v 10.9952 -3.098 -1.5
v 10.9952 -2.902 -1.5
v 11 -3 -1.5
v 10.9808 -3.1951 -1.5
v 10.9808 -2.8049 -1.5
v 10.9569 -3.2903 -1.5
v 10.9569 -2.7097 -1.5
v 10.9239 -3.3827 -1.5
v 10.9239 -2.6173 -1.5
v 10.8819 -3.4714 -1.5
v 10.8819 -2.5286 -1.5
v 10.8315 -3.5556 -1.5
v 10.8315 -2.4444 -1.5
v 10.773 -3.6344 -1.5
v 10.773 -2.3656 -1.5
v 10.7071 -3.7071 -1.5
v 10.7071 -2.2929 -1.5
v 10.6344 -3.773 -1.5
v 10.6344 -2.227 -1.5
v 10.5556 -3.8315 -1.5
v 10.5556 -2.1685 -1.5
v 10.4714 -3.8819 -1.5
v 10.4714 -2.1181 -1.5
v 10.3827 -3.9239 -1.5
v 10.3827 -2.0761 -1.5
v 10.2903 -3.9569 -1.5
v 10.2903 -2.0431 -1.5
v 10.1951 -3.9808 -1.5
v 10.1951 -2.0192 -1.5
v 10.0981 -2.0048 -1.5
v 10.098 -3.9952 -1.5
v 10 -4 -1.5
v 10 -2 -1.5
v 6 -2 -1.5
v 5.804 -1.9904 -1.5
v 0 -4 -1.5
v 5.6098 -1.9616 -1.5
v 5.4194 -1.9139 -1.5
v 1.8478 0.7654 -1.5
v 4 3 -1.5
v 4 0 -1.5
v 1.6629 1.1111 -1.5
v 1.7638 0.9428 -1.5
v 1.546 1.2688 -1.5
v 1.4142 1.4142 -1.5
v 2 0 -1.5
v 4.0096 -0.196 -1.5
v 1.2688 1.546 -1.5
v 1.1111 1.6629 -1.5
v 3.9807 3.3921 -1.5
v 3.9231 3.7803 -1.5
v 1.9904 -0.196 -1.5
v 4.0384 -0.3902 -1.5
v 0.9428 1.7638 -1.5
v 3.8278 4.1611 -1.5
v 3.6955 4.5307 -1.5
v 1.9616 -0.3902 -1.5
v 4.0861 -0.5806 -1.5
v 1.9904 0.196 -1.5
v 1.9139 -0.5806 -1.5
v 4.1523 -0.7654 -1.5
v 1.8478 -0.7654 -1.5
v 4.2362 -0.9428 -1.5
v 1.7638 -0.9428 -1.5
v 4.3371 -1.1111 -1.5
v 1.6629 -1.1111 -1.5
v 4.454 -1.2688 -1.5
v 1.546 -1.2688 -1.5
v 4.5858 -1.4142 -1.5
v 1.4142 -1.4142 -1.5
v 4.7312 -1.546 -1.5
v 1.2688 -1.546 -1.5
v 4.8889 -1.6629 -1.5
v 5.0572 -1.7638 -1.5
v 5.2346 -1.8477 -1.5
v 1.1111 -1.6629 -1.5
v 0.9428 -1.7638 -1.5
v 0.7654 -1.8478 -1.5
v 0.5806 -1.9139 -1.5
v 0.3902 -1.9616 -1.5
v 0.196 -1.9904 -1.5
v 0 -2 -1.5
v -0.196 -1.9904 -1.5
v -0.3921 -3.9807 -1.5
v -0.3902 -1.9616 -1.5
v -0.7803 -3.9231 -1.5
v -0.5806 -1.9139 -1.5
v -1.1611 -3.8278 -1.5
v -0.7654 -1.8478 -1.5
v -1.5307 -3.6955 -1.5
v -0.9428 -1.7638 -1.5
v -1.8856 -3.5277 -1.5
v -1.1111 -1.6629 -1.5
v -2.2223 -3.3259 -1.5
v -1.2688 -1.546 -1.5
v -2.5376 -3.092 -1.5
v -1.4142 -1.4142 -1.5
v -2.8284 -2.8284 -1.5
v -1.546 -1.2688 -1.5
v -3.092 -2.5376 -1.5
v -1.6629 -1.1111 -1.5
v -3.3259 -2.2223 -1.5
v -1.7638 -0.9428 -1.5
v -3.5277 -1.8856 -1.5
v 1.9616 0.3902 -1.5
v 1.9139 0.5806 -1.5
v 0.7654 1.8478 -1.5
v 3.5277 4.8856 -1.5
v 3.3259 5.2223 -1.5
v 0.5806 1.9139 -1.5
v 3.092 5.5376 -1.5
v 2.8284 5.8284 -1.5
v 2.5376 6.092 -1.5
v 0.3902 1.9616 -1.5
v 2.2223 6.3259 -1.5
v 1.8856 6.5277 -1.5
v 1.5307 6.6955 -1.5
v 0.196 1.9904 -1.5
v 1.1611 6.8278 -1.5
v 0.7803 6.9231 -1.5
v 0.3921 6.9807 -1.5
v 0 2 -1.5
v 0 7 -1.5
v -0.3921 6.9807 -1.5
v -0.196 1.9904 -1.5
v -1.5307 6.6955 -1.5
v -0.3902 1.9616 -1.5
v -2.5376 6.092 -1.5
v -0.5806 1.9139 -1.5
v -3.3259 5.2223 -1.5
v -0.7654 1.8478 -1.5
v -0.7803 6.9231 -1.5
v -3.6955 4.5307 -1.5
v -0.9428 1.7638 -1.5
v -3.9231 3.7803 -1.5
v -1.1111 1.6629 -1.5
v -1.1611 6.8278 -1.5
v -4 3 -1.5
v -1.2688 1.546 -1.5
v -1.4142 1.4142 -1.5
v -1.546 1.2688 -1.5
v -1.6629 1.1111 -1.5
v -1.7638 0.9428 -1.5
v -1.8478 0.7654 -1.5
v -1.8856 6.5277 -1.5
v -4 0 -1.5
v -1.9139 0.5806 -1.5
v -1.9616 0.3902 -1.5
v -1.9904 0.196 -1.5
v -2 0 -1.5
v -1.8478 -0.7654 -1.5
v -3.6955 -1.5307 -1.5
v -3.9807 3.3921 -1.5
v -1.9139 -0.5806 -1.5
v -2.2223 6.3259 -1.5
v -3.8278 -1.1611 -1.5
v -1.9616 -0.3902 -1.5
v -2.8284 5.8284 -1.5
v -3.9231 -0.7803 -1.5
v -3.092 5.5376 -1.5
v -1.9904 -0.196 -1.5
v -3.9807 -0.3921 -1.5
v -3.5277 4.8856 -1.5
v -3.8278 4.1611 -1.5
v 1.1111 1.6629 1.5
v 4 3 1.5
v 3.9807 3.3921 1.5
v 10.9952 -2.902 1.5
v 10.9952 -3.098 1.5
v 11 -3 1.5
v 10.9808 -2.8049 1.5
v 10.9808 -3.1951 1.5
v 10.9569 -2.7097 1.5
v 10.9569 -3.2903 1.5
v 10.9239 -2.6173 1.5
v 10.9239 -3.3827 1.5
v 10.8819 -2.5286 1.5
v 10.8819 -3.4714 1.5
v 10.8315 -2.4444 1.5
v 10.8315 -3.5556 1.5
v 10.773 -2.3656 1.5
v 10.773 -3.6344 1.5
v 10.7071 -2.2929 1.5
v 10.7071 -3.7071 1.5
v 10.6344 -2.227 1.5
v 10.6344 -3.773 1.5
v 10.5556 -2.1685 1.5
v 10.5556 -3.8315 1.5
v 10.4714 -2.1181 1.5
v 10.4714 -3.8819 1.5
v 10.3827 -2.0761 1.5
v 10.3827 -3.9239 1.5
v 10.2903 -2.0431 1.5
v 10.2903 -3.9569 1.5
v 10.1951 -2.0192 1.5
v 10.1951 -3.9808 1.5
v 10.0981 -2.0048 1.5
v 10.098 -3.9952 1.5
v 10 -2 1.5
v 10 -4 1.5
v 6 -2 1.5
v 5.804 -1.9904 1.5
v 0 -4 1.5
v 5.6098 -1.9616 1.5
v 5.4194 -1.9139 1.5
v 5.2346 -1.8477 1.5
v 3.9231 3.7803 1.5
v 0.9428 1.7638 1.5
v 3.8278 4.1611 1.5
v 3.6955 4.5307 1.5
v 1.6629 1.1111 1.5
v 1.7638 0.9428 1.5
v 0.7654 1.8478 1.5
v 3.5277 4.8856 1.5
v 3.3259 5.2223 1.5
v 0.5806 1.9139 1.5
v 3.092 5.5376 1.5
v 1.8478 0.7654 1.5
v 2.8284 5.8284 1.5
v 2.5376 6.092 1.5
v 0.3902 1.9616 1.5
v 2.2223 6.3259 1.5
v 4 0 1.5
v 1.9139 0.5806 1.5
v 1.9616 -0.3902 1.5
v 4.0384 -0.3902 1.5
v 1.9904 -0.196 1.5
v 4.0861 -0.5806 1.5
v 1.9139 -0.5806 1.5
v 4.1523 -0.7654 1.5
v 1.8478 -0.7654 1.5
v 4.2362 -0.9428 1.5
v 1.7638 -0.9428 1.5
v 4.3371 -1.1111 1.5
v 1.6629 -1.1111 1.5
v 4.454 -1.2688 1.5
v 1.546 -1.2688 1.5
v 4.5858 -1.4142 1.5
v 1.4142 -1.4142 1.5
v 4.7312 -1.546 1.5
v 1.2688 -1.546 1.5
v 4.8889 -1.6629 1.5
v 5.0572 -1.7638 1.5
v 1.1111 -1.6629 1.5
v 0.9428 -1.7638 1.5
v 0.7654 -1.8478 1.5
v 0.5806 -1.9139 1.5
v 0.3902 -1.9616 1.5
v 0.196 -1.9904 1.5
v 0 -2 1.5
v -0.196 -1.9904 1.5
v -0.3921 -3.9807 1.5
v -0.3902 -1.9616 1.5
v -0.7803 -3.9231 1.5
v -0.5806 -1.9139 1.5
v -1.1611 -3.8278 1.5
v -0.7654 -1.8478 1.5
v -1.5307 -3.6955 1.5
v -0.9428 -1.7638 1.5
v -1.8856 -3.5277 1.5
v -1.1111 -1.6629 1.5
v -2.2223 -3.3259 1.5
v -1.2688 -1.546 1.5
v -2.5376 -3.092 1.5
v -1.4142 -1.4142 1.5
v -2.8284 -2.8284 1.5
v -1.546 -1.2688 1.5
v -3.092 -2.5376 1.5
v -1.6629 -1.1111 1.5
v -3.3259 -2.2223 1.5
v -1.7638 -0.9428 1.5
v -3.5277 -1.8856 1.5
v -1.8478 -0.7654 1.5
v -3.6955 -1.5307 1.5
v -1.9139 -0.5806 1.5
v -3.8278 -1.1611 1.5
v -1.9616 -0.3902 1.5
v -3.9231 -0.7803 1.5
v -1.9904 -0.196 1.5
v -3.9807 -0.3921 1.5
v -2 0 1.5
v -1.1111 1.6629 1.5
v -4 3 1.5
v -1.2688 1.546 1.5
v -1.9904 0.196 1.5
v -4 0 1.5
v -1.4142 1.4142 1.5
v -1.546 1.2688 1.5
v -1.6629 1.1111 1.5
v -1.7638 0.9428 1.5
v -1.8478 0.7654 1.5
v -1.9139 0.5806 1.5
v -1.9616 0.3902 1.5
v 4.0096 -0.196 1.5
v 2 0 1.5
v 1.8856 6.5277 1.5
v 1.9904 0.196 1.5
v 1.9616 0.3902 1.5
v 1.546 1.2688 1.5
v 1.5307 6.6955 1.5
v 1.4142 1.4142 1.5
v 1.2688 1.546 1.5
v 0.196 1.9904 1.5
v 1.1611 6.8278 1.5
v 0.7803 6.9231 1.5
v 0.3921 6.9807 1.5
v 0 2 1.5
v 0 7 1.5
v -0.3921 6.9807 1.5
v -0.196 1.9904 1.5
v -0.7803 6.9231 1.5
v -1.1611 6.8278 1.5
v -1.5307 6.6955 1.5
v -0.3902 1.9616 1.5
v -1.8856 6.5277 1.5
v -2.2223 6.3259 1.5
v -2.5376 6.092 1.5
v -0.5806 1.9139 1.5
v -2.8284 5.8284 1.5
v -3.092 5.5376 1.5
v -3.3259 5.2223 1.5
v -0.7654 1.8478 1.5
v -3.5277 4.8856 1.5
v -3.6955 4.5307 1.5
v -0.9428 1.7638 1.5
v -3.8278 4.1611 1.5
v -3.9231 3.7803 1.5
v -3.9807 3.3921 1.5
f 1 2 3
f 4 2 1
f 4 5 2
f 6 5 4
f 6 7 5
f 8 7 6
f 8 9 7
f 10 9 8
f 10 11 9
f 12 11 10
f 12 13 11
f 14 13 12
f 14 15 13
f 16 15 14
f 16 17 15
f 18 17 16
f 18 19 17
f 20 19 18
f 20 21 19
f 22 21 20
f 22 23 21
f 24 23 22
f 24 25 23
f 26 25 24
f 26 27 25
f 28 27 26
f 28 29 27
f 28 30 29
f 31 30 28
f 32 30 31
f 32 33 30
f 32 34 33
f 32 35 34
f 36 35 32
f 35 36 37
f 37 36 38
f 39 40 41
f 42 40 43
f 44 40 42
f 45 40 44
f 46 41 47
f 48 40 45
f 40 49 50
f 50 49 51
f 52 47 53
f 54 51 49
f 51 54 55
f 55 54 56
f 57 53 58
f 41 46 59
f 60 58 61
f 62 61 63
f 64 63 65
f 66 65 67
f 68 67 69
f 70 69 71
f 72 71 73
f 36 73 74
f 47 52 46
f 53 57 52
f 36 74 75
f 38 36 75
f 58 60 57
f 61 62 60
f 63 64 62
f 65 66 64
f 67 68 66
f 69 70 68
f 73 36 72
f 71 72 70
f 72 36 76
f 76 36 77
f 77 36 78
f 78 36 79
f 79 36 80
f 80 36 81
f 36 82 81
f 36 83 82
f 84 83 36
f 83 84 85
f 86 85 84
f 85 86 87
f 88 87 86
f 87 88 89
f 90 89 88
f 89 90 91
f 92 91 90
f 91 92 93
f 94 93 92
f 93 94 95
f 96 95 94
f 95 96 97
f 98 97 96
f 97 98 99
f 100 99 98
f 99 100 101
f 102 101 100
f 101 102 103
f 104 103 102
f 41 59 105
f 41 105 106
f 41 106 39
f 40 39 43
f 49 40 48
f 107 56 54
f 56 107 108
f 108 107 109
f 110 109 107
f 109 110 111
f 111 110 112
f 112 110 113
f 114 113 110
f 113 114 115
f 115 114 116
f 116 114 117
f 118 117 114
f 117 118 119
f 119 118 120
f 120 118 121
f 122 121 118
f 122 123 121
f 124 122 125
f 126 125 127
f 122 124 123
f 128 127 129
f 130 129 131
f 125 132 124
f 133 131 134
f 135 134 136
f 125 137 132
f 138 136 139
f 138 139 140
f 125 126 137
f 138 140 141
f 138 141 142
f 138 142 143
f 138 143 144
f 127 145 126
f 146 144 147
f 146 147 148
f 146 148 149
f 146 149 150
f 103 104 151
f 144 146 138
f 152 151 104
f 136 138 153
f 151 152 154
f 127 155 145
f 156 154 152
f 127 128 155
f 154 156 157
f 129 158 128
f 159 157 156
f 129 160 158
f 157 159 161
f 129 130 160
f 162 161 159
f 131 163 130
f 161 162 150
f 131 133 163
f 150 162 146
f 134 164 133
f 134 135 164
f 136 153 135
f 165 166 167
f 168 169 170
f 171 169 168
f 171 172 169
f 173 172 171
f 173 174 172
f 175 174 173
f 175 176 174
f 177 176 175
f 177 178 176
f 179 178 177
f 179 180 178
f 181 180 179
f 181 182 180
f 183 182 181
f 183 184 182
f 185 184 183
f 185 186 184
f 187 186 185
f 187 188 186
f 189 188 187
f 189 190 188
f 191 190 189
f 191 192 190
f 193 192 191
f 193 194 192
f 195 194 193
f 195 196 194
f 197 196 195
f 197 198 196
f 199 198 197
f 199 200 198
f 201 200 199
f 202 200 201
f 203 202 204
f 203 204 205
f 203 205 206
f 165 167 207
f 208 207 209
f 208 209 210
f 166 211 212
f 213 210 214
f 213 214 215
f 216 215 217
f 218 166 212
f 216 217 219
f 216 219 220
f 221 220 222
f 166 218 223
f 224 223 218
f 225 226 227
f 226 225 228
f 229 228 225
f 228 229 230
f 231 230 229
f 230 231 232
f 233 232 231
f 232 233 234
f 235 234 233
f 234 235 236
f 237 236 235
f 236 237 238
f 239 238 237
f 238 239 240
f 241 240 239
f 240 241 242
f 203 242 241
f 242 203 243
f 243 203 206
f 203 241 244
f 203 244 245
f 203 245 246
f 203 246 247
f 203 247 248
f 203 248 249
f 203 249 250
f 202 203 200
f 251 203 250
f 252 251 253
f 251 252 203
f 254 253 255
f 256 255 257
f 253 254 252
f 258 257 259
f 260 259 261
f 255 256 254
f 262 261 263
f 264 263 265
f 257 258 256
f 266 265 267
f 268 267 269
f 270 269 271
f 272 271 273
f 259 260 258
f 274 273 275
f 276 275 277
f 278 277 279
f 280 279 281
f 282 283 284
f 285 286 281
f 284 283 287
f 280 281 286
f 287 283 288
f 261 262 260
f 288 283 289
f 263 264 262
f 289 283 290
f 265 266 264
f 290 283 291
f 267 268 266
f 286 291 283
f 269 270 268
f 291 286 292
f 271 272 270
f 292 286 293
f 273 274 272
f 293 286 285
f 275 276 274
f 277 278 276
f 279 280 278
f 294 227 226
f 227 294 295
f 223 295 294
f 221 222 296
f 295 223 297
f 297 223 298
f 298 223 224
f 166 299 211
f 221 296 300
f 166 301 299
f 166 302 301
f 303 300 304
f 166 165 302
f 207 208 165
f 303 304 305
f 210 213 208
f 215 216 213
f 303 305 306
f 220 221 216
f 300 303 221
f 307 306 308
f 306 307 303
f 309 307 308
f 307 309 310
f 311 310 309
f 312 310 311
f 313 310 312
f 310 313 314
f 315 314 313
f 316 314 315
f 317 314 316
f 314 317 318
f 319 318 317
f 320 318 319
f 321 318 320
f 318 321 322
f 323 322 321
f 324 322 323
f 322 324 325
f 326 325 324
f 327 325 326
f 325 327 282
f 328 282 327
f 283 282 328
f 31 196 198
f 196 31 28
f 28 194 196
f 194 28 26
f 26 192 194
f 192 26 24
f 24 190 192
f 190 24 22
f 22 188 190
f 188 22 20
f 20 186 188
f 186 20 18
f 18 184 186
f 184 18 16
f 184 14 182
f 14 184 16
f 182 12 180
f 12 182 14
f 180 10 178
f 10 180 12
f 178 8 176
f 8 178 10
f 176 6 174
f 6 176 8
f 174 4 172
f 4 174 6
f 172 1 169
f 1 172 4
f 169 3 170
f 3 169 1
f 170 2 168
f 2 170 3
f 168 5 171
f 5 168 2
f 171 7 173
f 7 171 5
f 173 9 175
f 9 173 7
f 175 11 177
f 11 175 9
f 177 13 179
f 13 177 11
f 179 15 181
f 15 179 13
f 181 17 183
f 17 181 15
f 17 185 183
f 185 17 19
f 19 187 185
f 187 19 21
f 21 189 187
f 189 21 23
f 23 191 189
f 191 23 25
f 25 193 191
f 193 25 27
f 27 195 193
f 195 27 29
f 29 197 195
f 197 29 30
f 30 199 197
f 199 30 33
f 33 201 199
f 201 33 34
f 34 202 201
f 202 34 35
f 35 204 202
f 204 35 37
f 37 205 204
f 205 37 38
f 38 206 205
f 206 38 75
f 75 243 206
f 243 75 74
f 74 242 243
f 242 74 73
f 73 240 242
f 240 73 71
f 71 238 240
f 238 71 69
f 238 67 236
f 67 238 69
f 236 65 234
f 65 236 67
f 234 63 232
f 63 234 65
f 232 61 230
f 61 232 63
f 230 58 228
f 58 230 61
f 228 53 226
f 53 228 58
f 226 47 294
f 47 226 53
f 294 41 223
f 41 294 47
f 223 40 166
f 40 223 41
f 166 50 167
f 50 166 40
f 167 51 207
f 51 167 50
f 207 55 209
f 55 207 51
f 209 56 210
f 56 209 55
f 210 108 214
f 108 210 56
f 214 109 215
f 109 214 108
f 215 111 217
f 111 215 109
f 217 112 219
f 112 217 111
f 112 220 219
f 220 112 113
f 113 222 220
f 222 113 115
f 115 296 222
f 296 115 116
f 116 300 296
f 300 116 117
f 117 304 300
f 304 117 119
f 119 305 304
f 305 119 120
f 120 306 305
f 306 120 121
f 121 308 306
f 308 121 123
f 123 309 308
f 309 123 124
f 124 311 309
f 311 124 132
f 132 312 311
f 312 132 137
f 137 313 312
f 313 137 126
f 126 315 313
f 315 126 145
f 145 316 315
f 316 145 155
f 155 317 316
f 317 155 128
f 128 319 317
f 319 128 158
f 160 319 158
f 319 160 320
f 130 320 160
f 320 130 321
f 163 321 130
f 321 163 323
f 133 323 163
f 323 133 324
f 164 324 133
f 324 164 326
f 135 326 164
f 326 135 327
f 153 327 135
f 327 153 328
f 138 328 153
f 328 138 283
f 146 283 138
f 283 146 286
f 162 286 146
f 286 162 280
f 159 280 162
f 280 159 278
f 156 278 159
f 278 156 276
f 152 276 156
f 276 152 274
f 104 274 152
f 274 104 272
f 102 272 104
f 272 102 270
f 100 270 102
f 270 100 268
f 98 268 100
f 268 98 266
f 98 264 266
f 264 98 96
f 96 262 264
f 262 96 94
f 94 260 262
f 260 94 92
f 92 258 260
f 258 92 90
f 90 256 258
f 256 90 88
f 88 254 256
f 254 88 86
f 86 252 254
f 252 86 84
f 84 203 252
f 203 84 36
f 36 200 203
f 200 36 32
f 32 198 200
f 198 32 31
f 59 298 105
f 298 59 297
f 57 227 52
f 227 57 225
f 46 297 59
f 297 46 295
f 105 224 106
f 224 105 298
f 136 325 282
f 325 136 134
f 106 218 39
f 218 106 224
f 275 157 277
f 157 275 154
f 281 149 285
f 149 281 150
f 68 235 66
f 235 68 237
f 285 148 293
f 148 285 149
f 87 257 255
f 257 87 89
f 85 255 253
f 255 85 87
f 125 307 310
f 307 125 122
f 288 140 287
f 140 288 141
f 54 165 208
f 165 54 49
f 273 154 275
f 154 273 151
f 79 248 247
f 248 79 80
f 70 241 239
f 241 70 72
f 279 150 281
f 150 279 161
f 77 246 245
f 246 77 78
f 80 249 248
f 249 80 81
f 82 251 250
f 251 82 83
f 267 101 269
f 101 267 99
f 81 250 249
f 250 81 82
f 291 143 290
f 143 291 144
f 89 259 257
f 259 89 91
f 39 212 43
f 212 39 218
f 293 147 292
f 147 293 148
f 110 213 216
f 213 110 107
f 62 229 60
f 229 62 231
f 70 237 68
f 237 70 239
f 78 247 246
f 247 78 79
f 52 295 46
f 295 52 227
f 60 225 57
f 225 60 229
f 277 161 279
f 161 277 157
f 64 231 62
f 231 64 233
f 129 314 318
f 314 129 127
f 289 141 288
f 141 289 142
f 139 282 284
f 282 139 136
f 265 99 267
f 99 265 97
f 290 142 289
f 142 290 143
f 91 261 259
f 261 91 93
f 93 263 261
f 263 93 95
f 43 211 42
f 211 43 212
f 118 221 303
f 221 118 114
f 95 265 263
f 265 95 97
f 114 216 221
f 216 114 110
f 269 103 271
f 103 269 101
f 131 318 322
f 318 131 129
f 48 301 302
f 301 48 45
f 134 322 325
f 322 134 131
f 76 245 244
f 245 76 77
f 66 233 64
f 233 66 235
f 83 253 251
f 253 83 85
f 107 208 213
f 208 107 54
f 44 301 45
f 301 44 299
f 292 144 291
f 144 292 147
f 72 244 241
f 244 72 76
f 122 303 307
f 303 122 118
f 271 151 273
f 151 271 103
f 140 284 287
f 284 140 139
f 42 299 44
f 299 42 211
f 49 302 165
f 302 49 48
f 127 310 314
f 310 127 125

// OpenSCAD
$fn = 64;

module inverse() difference() { square(1e6,center=true); child(); }
module offset(d=1) minkowski() { circle(d); child(); }

module s() {
	inverse() offset(2) inverse() offset(2) union() { 
		hull() { circle(r=4); translate([0,3]) circle(r=4); } 
		translate([0,-3]) hull() { circle(r=1); translate([10,0]) circle(r=1); } 
	}
}
difference() {
	linear_extrude(height=3,center=true,convexity=3) s();
	linear_extrude(height=9,center=true) circle(r=2);
}
